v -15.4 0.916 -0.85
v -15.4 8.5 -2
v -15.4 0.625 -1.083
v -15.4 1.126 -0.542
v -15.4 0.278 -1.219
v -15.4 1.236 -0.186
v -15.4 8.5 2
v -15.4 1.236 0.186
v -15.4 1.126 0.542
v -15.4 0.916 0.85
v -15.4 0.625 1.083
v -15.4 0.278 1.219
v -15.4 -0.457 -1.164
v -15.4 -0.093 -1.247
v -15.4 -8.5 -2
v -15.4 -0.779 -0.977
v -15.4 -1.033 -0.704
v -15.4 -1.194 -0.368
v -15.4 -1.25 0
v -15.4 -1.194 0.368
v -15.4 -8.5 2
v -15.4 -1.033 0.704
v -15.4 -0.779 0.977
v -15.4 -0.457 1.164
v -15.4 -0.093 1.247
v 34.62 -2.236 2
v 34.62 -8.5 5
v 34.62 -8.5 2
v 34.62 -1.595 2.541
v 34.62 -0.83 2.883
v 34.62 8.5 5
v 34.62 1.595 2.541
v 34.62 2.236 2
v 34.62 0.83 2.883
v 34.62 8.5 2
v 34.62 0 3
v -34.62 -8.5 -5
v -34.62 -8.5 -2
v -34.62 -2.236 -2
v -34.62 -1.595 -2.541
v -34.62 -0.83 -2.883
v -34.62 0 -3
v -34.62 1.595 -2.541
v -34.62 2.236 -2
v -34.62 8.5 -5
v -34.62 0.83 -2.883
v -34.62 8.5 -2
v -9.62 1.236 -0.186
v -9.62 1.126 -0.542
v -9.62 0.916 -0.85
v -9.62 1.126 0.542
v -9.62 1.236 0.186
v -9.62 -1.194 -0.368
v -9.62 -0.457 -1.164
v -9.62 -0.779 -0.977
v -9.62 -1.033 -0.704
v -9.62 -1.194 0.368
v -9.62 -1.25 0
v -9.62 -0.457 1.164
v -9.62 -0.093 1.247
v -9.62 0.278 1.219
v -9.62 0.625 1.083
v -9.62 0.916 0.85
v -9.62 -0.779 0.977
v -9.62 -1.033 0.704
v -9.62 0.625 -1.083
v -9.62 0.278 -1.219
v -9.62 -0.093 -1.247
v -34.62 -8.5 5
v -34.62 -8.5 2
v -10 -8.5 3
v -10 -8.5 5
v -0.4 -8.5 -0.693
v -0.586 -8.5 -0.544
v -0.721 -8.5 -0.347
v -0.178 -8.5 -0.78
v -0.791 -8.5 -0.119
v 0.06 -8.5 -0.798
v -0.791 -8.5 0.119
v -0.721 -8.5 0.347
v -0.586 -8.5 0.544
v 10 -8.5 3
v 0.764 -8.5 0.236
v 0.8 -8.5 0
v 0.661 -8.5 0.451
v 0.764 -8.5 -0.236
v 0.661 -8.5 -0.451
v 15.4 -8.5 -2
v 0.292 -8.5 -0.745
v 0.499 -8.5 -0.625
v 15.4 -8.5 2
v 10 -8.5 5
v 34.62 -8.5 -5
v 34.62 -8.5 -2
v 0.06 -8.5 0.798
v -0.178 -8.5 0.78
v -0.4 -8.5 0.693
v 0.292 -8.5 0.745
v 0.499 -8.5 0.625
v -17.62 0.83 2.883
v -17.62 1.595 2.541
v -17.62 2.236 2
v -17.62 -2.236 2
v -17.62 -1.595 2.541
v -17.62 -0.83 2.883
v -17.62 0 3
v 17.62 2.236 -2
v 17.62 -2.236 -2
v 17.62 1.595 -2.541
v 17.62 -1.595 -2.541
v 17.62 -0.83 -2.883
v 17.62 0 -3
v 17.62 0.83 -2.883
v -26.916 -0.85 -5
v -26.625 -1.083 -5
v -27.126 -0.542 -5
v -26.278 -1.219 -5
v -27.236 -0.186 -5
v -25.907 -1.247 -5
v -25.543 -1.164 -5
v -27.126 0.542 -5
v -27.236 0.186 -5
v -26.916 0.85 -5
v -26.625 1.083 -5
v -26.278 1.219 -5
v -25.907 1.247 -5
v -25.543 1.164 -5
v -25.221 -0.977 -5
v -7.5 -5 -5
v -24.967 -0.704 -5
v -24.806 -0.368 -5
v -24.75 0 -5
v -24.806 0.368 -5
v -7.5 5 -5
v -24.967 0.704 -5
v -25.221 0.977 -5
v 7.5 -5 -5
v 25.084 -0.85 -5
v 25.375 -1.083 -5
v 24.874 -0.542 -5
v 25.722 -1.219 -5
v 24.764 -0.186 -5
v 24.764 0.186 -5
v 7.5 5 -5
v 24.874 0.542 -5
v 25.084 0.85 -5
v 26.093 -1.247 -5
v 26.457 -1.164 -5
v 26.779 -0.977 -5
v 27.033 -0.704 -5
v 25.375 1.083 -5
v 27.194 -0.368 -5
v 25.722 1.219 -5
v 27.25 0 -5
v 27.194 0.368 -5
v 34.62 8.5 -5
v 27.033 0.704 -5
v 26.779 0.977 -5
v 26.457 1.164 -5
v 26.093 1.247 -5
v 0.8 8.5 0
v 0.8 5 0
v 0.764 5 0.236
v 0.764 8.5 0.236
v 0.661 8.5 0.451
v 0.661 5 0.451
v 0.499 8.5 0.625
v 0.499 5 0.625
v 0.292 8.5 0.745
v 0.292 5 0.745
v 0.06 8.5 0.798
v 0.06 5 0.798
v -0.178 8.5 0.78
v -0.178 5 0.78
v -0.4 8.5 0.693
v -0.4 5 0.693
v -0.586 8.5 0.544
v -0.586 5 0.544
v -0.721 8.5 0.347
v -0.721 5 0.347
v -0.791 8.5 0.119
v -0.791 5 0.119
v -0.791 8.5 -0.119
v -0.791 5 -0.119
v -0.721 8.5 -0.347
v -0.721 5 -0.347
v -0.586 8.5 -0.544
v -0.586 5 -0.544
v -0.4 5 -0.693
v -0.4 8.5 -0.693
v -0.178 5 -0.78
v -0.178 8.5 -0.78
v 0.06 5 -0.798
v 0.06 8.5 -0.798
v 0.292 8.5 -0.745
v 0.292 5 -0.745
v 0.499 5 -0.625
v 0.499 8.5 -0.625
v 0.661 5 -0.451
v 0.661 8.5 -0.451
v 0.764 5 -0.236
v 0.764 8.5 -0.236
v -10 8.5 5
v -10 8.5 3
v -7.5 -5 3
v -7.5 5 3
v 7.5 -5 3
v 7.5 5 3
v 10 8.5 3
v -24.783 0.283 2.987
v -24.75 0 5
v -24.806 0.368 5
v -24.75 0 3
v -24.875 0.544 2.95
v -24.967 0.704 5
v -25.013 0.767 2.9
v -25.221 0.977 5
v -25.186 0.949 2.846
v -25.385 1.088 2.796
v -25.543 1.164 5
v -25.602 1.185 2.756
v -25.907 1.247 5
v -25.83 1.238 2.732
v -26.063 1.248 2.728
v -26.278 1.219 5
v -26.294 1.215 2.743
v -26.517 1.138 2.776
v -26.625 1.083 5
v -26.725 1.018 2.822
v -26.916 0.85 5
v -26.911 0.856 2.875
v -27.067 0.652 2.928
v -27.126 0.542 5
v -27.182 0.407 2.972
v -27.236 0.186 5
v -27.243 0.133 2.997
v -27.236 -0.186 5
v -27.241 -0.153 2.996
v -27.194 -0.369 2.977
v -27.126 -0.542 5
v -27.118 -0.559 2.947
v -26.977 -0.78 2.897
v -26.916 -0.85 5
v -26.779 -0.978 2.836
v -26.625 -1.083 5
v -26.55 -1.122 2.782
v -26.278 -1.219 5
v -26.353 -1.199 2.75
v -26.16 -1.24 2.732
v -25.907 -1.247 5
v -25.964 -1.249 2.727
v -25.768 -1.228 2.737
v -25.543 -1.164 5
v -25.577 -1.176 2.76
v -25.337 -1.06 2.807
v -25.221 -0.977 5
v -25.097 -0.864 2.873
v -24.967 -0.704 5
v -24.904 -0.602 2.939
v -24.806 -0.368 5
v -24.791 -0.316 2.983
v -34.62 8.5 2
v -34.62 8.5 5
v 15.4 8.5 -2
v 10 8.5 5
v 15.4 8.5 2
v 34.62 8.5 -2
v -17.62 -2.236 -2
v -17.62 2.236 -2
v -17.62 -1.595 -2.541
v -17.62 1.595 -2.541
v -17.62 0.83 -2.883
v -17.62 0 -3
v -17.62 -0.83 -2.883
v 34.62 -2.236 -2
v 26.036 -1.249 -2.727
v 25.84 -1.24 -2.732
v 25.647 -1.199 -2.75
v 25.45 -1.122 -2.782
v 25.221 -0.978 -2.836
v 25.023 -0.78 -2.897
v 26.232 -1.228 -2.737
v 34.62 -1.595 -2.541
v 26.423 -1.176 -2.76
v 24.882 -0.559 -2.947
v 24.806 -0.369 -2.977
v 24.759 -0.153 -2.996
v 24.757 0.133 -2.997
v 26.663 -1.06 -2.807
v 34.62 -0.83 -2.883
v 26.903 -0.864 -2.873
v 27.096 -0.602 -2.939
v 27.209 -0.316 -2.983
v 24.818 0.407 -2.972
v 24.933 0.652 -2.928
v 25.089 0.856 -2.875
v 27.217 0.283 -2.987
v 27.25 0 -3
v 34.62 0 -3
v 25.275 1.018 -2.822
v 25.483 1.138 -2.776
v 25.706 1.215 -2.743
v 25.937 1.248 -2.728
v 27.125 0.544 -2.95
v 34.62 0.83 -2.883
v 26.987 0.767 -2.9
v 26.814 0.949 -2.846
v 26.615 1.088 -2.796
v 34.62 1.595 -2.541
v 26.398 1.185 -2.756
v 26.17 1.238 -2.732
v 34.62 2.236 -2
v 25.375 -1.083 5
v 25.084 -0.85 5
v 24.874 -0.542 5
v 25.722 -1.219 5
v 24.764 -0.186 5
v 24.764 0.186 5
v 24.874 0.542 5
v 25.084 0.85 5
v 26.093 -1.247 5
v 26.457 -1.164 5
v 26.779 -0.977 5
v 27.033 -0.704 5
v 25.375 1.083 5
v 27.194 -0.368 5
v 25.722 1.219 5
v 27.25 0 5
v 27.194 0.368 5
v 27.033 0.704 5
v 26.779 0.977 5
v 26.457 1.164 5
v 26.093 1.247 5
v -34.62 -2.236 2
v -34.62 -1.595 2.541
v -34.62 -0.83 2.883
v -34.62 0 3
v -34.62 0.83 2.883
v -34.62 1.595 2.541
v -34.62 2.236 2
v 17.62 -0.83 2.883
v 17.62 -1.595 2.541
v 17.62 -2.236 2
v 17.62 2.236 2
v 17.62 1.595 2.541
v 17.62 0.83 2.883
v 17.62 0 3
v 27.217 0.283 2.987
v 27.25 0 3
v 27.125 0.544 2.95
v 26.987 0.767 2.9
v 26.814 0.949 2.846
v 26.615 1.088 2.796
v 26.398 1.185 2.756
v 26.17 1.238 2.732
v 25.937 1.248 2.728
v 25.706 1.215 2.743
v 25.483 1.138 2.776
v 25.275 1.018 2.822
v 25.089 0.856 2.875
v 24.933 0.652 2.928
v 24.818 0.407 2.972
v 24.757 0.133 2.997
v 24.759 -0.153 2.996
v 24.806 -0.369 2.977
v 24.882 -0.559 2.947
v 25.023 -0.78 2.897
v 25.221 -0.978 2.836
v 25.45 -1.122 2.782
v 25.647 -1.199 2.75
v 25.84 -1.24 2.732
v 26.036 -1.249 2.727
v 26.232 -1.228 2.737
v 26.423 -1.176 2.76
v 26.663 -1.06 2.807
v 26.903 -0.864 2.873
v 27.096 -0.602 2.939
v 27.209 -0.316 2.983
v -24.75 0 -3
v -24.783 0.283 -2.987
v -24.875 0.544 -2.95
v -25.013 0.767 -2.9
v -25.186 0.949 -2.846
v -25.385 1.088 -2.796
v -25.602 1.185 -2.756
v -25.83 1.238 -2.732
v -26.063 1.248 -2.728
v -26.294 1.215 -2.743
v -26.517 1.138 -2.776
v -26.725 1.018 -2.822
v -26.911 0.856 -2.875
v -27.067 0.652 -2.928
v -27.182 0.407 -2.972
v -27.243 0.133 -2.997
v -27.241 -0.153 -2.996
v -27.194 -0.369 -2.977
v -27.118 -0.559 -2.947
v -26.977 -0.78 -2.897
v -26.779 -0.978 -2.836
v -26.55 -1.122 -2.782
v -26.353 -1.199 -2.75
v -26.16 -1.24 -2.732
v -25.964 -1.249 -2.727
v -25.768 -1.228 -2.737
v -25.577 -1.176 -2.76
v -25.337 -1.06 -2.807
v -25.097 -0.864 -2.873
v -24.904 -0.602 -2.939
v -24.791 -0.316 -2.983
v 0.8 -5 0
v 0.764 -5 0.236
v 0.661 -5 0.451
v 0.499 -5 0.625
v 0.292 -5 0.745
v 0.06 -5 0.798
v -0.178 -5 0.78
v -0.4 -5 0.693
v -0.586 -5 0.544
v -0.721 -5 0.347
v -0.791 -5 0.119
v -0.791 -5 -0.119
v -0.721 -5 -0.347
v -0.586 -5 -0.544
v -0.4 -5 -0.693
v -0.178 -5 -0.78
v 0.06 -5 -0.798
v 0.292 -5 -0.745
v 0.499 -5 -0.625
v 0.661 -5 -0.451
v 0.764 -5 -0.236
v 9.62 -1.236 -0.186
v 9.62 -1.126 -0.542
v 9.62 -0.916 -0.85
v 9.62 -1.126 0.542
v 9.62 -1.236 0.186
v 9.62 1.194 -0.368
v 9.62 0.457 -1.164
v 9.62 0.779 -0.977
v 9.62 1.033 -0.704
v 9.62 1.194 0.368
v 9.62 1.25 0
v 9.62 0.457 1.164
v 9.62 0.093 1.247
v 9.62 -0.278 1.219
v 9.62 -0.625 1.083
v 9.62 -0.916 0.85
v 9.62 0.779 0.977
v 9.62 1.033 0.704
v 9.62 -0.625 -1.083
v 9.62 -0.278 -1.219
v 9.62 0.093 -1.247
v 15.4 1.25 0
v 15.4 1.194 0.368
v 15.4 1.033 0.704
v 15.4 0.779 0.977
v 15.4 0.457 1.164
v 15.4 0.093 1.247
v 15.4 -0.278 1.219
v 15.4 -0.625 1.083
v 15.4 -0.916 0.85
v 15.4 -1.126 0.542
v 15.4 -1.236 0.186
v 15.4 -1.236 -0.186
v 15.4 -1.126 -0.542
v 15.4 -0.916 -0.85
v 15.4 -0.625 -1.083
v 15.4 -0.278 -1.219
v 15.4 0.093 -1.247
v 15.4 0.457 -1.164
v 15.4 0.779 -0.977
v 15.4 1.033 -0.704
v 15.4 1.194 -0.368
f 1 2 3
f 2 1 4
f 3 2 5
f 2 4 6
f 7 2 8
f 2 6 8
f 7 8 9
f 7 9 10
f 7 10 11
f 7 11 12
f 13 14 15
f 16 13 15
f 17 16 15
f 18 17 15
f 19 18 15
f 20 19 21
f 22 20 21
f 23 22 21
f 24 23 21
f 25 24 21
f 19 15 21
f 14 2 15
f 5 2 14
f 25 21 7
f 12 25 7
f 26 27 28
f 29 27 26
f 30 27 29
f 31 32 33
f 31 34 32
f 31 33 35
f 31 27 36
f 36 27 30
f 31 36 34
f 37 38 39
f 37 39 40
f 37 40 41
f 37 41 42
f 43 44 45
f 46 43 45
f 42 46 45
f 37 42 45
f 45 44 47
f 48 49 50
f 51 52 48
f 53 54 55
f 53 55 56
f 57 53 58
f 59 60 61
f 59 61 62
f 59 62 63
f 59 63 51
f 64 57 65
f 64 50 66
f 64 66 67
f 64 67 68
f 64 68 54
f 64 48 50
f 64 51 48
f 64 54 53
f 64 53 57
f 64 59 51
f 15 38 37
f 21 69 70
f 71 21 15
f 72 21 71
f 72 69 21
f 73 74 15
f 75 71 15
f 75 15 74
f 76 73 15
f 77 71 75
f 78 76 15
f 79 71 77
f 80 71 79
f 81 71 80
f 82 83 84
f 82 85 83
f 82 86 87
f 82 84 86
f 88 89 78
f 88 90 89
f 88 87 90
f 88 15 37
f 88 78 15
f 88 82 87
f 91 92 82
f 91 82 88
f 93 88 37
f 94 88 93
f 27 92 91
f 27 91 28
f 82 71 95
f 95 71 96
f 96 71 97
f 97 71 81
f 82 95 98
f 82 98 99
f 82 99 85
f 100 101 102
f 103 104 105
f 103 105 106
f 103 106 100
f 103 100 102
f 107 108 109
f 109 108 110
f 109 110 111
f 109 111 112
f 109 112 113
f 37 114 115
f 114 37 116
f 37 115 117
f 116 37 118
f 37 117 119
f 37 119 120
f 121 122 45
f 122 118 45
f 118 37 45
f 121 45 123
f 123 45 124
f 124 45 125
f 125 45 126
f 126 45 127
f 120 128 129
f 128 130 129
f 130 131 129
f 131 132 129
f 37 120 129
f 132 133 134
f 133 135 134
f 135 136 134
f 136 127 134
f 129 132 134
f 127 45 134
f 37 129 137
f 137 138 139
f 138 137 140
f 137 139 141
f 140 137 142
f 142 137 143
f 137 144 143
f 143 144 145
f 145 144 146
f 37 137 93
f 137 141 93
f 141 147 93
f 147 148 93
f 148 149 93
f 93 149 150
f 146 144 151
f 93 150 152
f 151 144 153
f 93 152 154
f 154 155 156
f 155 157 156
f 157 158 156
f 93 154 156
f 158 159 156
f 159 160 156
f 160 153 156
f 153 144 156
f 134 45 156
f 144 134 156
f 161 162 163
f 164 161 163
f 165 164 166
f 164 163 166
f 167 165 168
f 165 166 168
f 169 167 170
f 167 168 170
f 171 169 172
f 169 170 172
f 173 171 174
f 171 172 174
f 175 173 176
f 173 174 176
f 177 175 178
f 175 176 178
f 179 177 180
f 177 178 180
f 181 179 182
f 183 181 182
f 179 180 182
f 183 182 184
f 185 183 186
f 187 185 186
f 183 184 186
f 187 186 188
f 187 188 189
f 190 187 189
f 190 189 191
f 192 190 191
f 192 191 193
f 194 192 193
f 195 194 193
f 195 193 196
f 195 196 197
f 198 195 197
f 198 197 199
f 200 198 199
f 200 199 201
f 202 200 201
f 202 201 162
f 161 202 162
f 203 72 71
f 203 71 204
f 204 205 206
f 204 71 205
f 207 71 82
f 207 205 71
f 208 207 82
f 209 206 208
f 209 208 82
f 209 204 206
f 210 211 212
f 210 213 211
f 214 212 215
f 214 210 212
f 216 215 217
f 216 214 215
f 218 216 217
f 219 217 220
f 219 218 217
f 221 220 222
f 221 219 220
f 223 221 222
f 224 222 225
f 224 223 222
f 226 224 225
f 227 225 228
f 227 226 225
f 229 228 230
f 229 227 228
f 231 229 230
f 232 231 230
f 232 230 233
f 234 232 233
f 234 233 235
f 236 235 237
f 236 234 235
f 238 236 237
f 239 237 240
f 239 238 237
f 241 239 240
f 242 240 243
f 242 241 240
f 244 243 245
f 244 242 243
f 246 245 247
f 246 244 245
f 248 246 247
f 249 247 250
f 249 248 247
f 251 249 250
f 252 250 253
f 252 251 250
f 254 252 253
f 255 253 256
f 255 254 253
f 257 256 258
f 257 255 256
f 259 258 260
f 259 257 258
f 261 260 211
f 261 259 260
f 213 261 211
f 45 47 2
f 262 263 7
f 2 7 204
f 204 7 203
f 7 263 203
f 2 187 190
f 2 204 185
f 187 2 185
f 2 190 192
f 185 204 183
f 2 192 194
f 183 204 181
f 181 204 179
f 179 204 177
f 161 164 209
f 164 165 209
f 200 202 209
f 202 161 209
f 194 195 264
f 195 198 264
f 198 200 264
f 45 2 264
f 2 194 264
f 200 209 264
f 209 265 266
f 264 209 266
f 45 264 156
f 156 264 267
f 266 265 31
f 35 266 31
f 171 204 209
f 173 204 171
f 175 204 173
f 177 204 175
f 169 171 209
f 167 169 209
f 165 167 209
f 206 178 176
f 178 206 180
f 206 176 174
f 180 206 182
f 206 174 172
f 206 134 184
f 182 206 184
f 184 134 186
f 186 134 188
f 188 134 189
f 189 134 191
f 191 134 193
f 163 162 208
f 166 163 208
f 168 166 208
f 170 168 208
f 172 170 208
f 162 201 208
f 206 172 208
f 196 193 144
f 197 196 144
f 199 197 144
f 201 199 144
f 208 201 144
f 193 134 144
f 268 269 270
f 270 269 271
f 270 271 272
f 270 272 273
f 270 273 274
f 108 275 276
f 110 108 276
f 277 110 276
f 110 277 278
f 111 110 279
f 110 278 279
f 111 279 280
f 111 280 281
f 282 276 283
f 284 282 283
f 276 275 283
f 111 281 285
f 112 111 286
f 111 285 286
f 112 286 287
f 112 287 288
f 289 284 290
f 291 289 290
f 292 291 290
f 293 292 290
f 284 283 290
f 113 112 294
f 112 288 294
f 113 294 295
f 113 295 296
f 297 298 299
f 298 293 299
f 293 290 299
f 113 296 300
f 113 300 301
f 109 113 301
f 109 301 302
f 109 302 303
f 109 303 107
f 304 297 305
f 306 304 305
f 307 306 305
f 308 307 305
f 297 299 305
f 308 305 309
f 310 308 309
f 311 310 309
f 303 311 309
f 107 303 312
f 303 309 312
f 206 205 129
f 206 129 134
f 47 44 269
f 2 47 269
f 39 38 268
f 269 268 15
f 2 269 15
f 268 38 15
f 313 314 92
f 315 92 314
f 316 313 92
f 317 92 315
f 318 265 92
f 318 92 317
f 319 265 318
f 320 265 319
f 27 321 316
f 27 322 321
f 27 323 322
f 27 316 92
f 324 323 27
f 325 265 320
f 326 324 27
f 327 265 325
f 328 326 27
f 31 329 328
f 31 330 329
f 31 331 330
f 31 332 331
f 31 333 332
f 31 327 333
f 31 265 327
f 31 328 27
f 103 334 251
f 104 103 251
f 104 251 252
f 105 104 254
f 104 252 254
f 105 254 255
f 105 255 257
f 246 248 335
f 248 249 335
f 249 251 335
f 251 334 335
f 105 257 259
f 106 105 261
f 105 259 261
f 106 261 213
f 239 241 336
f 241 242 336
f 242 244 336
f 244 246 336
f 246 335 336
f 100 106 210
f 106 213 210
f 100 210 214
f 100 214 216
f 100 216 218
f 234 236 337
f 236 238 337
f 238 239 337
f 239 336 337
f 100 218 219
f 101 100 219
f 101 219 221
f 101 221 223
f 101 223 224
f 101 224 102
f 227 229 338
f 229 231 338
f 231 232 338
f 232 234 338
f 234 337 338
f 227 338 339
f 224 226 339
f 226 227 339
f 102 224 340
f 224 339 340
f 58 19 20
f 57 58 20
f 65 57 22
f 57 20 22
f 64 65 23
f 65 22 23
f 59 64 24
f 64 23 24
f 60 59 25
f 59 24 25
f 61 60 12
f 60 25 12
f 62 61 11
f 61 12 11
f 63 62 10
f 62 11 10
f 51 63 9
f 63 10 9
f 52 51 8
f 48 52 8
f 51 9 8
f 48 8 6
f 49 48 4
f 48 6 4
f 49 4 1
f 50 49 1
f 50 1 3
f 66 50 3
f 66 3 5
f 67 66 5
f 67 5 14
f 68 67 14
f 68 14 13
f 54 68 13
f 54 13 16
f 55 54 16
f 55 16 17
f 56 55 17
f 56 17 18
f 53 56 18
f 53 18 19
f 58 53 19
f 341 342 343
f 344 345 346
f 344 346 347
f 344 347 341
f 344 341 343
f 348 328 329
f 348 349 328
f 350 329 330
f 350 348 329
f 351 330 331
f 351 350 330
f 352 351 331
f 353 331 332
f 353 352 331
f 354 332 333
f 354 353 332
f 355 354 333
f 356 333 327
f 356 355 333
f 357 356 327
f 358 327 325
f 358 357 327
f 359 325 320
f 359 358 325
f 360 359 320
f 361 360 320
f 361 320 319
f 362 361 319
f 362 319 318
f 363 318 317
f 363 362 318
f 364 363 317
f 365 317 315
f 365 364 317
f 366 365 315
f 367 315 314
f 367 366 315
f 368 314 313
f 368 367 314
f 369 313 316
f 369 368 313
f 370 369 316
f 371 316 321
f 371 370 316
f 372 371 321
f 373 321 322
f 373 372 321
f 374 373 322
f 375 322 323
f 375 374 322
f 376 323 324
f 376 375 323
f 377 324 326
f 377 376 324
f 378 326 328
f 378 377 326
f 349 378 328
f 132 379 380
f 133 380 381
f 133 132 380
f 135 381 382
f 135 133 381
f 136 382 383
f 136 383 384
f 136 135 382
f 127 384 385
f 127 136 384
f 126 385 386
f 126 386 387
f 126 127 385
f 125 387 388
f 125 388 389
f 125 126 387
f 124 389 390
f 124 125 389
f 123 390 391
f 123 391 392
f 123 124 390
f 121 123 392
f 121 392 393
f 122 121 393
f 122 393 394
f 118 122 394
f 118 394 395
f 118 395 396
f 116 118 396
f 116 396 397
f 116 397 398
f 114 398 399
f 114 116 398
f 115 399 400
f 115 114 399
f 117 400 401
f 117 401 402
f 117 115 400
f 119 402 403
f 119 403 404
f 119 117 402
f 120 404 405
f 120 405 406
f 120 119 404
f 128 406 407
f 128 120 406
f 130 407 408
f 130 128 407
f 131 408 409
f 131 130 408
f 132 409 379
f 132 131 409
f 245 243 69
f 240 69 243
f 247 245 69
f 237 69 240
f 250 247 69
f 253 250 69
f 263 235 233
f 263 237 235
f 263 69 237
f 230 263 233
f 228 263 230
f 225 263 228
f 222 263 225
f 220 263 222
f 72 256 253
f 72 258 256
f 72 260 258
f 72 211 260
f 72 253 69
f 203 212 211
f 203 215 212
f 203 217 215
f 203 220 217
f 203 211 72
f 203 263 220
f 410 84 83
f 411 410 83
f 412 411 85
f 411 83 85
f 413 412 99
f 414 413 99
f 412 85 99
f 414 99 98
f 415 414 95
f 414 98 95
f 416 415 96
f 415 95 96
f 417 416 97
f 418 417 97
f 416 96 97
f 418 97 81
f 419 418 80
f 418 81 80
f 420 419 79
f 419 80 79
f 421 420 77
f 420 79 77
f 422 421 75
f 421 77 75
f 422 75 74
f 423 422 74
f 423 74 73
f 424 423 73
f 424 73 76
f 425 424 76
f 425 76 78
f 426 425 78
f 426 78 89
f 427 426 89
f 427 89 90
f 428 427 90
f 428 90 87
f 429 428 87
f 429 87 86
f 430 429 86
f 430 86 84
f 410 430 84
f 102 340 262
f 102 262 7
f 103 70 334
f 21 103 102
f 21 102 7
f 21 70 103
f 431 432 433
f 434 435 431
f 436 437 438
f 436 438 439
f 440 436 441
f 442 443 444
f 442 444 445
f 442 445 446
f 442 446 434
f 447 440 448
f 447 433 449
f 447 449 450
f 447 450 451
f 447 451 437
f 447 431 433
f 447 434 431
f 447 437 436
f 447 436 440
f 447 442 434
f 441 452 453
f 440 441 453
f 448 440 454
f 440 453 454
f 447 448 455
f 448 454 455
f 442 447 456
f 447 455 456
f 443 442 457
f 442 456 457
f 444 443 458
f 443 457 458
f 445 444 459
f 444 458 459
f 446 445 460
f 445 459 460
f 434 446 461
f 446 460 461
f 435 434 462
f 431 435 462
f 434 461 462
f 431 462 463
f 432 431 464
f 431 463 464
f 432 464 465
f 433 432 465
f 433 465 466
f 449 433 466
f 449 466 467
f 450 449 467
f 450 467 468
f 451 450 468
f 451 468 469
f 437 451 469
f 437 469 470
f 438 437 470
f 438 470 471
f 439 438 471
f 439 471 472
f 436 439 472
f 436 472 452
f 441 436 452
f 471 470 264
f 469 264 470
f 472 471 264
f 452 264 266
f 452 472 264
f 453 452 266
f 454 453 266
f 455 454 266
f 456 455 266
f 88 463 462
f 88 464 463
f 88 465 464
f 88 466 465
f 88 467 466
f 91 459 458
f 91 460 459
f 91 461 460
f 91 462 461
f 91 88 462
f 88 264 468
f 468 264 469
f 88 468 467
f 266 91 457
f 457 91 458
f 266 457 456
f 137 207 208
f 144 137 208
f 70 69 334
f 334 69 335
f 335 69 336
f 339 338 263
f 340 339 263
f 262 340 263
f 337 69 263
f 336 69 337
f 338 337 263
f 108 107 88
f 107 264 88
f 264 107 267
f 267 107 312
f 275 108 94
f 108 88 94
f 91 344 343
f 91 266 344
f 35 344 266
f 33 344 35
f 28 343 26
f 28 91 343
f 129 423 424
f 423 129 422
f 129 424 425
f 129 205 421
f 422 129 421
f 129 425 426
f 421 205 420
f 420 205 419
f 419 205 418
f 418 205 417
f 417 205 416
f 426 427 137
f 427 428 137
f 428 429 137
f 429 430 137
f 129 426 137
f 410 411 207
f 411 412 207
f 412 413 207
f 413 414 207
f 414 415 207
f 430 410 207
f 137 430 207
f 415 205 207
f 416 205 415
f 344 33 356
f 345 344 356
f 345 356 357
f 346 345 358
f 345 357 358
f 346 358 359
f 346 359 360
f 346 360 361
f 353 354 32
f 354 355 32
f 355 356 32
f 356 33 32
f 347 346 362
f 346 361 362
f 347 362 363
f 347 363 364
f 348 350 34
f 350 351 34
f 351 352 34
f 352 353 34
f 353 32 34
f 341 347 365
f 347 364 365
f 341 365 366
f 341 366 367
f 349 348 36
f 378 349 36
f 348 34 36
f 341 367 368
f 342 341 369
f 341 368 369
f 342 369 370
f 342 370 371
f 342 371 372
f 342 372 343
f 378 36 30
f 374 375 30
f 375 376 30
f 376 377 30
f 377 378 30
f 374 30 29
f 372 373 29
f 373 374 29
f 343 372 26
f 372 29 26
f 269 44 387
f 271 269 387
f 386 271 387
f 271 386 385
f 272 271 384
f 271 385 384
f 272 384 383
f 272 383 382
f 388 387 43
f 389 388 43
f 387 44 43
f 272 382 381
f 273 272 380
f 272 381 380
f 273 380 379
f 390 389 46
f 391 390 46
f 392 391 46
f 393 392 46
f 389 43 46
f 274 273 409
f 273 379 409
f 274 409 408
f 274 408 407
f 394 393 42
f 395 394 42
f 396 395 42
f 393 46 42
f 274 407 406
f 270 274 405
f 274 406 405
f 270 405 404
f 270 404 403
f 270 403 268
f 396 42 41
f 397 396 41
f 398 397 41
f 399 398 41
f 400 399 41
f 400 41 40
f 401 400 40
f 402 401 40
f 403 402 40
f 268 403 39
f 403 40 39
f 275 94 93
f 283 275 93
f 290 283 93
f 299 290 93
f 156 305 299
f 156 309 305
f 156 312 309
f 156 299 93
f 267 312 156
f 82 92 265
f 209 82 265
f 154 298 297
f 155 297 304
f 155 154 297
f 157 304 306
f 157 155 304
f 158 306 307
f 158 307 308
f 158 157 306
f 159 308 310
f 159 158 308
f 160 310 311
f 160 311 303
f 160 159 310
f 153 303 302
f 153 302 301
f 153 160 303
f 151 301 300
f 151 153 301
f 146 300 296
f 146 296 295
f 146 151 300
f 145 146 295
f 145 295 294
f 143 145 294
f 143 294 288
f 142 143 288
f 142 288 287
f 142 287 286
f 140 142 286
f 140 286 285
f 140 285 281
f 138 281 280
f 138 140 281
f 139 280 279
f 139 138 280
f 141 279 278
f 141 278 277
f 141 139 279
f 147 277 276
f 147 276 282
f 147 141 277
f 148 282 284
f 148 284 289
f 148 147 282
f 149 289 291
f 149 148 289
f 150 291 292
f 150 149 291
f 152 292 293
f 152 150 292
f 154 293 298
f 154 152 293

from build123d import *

# Parameters (mm, degrees)
F0_W      = 69.24
F0_H      = 17
F0_R      = 1.25
F0_W_2    = 15
F0_H_2    = 10
F1_DEPTH  = 5
F2_R      = 0.8
F2_W      = 19.22
F2_H      = 4
F3_DEPTH  = 25
F4_R      = 1.25
F5_DEPTH  = 25
F6_R      = 3
F7_DEPTH  = 17
F8_R      = 1.25
F9_DEPTH  = 25
F10_R     = 3
F11_DEPTH = 17
F12_W     = 20
F12_H     = 17
F13_DEPTH = 2


with BuildPart() as f1:
    # F0 (on Top) → F1 (new body, symmetric)
    with BuildSketch(Plane.XY):
        Rectangle(F0_W, F0_H)
        with Locations((-26, 0)):
            Circle(F0_R, mode=Mode.SUBTRACT)
        Rectangle(F0_W_2, F0_H_2, mode=Mode.SUBTRACT)
        with Locations((26, 0)):
            Circle(F0_R, mode=Mode.SUBTRACT)
    extrude(amount=F1_DEPTH, both=True)

    # F2 (on face) → F3 (cut)
    with BuildSketch(Plane.XZ.offset(8.5)):
        Circle(F2_R)
        with Locations((-25.01, 0)):
            Rectangle(F2_W, F2_H)
        with Locations((25.01, 0)):
            Rectangle(F2_W, F2_H)
    extrude(amount=-F3_DEPTH, mode=Mode.SUBTRACT)

    # F4 (on face) → F5 (cut)
    with BuildSketch(Plane(origin=(-34.62, 0, 0), x_dir=(0, -1, 0), z_dir=(-1, 0, 0))):
        Circle(F4_R)
    extrude(amount=-F5_DEPTH, mode=Mode.SUBTRACT)

    # F6 (on face) → F7 (cut)
    with BuildSketch(Plane(origin=(-34.62, 0, 0), x_dir=(0, -1, 0), z_dir=(-1, 0, 0))):
        Circle(F6_R)
    extrude(amount=-F7_DEPTH, mode=Mode.SUBTRACT)

    # F8 (on face) → F9 (cut)
    with BuildSketch(Plane.YZ.offset(34.62)):
        Circle(F8_R)
    extrude(amount=-F9_DEPTH, mode=Mode.SUBTRACT)

    # F10 (on face) → F11 (cut)
    with BuildSketch(Plane.YZ.offset(34.62)):
        Circle(F10_R)
    extrude(amount=-F11_DEPTH, mode=Mode.SUBTRACT)

    # F12 (on face) → F13 (cut)
    with BuildSketch(Plane.XY.offset(5)):
        Rectangle(F12_W, F12_H)
    extrude(amount=-F13_DEPTH, mode=Mode.SUBTRACT)


solid = f1.part
